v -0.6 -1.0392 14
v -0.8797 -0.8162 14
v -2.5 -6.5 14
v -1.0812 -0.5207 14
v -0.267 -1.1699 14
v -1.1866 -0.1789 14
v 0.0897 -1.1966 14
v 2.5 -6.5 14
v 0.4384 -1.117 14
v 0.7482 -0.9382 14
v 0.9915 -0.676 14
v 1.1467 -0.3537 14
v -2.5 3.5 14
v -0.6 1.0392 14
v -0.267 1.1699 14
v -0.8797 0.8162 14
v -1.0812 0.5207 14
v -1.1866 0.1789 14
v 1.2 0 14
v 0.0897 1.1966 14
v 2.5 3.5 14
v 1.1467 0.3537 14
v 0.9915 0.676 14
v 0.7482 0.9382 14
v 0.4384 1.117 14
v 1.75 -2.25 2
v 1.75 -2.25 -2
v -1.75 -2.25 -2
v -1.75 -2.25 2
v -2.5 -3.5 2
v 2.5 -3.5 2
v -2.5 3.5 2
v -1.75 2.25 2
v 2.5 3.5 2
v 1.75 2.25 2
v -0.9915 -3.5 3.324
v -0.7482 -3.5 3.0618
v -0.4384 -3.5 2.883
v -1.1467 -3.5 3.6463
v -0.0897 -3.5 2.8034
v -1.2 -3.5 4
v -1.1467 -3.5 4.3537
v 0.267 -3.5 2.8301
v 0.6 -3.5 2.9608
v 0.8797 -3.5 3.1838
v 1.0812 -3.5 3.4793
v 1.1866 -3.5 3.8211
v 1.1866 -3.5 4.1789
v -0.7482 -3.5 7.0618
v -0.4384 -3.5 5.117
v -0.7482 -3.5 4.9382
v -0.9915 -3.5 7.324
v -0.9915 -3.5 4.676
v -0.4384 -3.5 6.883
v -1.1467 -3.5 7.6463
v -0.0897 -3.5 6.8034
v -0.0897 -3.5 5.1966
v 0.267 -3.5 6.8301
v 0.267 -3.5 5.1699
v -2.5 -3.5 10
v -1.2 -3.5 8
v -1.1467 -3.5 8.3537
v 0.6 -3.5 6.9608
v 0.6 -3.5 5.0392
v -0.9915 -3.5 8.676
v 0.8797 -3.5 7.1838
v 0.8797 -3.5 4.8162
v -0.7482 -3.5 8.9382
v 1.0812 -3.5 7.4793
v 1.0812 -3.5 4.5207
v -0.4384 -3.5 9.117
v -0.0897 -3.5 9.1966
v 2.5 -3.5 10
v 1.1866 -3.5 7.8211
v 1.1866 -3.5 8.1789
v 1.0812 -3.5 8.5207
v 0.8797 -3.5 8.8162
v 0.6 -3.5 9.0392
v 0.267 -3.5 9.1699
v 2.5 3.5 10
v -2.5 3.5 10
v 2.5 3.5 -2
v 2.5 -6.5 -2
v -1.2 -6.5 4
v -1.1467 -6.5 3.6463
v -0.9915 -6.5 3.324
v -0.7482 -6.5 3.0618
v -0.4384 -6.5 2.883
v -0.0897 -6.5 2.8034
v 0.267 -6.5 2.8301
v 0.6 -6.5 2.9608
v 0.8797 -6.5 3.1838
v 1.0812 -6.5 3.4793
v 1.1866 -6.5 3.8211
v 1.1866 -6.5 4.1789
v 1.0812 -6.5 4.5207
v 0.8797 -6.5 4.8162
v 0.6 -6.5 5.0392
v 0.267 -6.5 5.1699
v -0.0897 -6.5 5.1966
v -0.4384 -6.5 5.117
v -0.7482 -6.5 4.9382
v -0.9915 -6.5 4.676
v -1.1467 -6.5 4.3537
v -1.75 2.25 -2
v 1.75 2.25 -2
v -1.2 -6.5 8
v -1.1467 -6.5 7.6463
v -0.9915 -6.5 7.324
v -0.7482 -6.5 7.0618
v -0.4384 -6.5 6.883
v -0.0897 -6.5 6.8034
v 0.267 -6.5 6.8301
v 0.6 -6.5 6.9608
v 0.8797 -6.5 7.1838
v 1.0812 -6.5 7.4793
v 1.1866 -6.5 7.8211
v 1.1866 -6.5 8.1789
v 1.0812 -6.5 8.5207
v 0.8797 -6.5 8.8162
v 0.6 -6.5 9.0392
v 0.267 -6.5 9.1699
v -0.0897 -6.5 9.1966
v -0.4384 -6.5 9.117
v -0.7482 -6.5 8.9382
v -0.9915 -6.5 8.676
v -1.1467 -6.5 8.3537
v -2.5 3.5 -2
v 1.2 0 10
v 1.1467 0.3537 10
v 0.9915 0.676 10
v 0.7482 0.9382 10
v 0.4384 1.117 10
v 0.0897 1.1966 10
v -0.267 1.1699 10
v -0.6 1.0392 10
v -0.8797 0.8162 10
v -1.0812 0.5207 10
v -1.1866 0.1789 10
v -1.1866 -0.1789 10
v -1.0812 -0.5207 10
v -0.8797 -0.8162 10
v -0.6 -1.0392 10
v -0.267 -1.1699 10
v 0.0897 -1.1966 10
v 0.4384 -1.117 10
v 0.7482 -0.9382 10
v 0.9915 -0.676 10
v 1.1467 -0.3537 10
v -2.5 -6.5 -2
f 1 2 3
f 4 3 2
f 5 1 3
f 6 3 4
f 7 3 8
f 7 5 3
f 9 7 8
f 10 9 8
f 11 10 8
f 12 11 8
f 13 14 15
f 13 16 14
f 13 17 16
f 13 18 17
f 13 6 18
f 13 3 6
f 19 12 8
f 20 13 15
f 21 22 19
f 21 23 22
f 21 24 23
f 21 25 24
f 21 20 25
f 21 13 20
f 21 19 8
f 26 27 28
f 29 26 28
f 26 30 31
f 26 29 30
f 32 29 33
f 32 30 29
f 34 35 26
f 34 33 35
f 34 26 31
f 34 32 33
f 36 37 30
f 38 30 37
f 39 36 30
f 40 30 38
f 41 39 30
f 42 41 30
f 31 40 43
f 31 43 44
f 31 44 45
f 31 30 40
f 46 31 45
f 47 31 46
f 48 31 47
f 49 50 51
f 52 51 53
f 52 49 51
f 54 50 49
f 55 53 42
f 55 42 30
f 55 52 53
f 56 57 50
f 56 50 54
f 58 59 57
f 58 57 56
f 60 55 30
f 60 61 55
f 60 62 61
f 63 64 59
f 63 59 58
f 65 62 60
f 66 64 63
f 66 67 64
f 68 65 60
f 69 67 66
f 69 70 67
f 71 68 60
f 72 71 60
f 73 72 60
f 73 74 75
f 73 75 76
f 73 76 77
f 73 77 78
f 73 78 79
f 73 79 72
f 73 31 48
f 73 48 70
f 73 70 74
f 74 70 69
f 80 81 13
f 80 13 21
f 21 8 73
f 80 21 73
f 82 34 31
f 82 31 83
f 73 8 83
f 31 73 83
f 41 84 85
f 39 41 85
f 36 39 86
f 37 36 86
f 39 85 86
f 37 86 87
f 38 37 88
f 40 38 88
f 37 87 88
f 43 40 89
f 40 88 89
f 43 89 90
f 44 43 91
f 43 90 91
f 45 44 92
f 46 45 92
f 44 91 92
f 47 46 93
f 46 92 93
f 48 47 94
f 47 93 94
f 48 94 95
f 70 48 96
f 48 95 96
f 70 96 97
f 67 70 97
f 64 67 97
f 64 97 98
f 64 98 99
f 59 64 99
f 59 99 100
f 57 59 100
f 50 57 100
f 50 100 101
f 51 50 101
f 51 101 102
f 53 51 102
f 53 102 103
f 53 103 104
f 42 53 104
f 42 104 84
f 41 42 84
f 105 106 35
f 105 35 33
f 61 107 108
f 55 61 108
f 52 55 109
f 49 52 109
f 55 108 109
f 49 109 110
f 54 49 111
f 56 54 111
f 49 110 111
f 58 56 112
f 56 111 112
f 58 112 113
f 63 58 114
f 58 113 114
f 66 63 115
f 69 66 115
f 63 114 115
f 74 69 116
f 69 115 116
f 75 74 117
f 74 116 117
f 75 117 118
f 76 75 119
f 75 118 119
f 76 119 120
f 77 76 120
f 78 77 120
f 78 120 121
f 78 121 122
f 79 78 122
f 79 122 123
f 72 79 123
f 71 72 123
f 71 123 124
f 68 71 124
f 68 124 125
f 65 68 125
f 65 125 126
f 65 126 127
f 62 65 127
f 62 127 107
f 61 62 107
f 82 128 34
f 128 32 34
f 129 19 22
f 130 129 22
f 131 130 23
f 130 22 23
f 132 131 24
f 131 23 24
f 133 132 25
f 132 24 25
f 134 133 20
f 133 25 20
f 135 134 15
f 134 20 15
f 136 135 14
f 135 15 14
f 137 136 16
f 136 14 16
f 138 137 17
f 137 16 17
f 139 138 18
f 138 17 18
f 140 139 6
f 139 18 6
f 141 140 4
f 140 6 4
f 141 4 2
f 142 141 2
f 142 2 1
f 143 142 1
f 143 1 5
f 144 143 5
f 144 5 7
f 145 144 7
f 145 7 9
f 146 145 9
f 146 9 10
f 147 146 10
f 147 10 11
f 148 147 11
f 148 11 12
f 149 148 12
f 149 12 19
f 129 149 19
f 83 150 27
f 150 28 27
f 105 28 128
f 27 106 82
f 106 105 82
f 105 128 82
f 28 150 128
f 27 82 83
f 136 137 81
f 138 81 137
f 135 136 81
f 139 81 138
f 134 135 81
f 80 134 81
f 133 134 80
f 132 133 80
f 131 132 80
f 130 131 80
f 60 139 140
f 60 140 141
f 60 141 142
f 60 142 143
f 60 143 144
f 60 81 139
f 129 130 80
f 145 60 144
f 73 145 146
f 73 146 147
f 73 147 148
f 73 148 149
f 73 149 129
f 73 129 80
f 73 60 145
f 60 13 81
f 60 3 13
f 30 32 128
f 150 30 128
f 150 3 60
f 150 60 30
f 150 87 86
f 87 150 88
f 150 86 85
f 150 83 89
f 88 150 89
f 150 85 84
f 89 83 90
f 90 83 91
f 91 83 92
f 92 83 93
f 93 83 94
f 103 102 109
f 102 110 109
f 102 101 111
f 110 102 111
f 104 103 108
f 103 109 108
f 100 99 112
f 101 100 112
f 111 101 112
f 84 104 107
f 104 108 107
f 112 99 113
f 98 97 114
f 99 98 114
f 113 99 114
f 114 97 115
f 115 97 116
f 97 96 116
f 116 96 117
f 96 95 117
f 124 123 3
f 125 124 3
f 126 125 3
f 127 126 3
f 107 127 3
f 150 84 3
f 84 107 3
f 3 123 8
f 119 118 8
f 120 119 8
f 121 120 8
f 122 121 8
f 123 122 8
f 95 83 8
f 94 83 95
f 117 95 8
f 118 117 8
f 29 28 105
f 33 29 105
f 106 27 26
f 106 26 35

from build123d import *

# Parameters (mm, degrees)
SKETCH1_W                 = 5
SKETCH1_H                 = 7
BOSS_EXTRUDE1_DEPTH       = 2
BOSS_EXTRUDE3_DEPTH       = 3
SKETCH13_W                = 5
SKETCH13_H                = 4
BOSS_EXTRUDE4_DEPTH       = 7
SKETCH14_W                = 4
SKETCH14_H                = 4
BOSS_EXTRUDE6_DEPTH       = 3
FILLET1_R                 = 2.5
M2_CLEARANCE_HOLE3_REACH  = 20.453
M2_CLEARANCE_HOLE3_BORE_R = 1.2
SKETCH15_W                = 3.5
SKETCH15_H                = 4.5
CUT_EXTRUDE1_DEPTH        = 4
M2_CLEARANCE_HOLE2_D      = 2.4
M2_CLEARANCE_HOLE2_DEPTH  = 4
M2_CLEARANCE_HOLE2_TIP    = 0.721032743
SKETCH22_W                = 4
SKETCH22_H                = 16
CUT_EXTRUDE2_DEPTH        = 3


with BuildPart() as part:
    # Sketch1 → Boss-Extrude1 (new, symmetric)
    with BuildSketch(Plane.XY):
        Rectangle(SKETCH1_W, SKETCH1_H)
    extrude(amount=BOSS_EXTRUDE1_DEPTH, both=True)

    # Sketch9 → Boss-Extrude3 (add)
    with BuildSketch(Plane.XZ.offset(3.5)):
        Polygon((2.5, 2), (6.5, 2), (6.5, -2), (2.5, -2), (-2.5, -2), (-2.5, 2), (-2.5, 14), (2.5, 14), align=None)
    extrude(amount=BOSS_EXTRUDE3_DEPTH)

    # Sketch13 → Boss-Extrude4 (add)
    with BuildSketch(Plane(origin=(0, -3.5, 0), x_dir=(1, 0, 0), z_dir=(0, 1, 0))):
        with Locations((0, -12)):
            Rectangle(SKETCH13_W, SKETCH13_H)
    extrude(amount=BOSS_EXTRUDE4_DEPTH)

    # Sketch14 → Boss-Extrude6 (add)
    with BuildSketch(Plane(origin=(0, -3.5, 0), x_dir=(1, 0, 0), z_dir=(0, 1, 0))):
        with Locations((4.5, -12)):
            Rectangle(SKETCH14_W, SKETCH14_H)
    extrude(amount=-BOSS_EXTRUDE6_DEPTH)

    # Fillet1
    # the kernel refuses this fillet: 2.5 mm, written as the material it adds along each edge
    with BuildSketch(Plane(origin=(2.5, -3.5, 2), x_dir=(0, 0, 1), z_dir=(0, -1, 0))) as fillet1_piece_1:
        with BuildLine():
            CenterArc((FILLET1_R, -FILLET1_R), FILLET1_R, 90, 90)
            Line((0, -FILLET1_R), (0, 0))
            Line((0, 0), (FILLET1_R, 0))
        make_face()
    extrude(amount=3)
    with BuildSketch(Plane(origin=(2.5, -3.5, 10), x_dir=(0, 0, -1), z_dir=(0, -1, 0))) as fillet1_piece_2:
        with BuildLine():
            CenterArc((FILLET1_R, FILLET1_R), FILLET1_R, 180, 90)
            Line((0, FILLET1_R), (0, 0))
            Line((0, 0), (FILLET1_R, 0))
        make_face()
    extrude(amount=3)

    # M2 Clearance Hole3 bore → M2 Clearance Hole3 (cut, up to next)
    with BuildSketch(Plane.XY.offset(14), mode=Mode.PRIVATE) as m2_clearance_hole3_sk1:
        Circle(M2_CLEARANCE_HOLE3_BORE_R)
    m2_clearance_hole3_tool1 = extrude(m2_clearance_hole3_sk1.sketch, amount=-M2_CLEARANCE_HOLE3_REACH, mode=Mode.PRIVATE) & part.part
    add(m2_clearance_hole3_tool1.solids().sort_by_distance((0, 0, 14))[0], mode=Mode.SUBTRACT)

    # Sketch15 → Cut-Extrude1 (cut)
    with BuildSketch(Plane(origin=(0, 0, -2), x_dir=(-1, 0, 0), z_dir=(0, 0, -1))):
        Rectangle(SKETCH15_W, SKETCH15_H)
    extrude(amount=-CUT_EXTRUDE1_DEPTH, mode=Mode.SUBTRACT)

    # M2 Clearance Hole2
    with Locations(Plane(origin=(0, -3.5, 0), x_dir=(1, 0, 0), z_dir=(0, 1, 0))):
        with Locations((4.5, -12), (0, -8), (0, -4), (4.5, 0)):
            Hole(M2_CLEARANCE_HOLE2_D / 2, depth=M2_CLEARANCE_HOLE2_DEPTH)
            with Locations((0, 0, -(M2_CLEARANCE_HOLE2_DEPTH + M2_CLEARANCE_HOLE2_TIP / 2))):  # 118° drill point
                Cone(0, M2_CLEARANCE_HOLE2_D / 2, M2_CLEARANCE_HOLE2_TIP, mode=Mode.SUBTRACT)

    # Sketch22 → Cut-Extrude2 (cut)
    with BuildSketch(Plane(origin=(0, -3.5, 0), x_dir=(1, 0, 0), z_dir=(0, 1, 0))):
        with Locations((4.5, -6)):
            Rectangle(SKETCH22_W, SKETCH22_H)
    extrude(amount=-CUT_EXTRUDE2_DEPTH, mode=Mode.SUBTRACT)


solid = part.part
